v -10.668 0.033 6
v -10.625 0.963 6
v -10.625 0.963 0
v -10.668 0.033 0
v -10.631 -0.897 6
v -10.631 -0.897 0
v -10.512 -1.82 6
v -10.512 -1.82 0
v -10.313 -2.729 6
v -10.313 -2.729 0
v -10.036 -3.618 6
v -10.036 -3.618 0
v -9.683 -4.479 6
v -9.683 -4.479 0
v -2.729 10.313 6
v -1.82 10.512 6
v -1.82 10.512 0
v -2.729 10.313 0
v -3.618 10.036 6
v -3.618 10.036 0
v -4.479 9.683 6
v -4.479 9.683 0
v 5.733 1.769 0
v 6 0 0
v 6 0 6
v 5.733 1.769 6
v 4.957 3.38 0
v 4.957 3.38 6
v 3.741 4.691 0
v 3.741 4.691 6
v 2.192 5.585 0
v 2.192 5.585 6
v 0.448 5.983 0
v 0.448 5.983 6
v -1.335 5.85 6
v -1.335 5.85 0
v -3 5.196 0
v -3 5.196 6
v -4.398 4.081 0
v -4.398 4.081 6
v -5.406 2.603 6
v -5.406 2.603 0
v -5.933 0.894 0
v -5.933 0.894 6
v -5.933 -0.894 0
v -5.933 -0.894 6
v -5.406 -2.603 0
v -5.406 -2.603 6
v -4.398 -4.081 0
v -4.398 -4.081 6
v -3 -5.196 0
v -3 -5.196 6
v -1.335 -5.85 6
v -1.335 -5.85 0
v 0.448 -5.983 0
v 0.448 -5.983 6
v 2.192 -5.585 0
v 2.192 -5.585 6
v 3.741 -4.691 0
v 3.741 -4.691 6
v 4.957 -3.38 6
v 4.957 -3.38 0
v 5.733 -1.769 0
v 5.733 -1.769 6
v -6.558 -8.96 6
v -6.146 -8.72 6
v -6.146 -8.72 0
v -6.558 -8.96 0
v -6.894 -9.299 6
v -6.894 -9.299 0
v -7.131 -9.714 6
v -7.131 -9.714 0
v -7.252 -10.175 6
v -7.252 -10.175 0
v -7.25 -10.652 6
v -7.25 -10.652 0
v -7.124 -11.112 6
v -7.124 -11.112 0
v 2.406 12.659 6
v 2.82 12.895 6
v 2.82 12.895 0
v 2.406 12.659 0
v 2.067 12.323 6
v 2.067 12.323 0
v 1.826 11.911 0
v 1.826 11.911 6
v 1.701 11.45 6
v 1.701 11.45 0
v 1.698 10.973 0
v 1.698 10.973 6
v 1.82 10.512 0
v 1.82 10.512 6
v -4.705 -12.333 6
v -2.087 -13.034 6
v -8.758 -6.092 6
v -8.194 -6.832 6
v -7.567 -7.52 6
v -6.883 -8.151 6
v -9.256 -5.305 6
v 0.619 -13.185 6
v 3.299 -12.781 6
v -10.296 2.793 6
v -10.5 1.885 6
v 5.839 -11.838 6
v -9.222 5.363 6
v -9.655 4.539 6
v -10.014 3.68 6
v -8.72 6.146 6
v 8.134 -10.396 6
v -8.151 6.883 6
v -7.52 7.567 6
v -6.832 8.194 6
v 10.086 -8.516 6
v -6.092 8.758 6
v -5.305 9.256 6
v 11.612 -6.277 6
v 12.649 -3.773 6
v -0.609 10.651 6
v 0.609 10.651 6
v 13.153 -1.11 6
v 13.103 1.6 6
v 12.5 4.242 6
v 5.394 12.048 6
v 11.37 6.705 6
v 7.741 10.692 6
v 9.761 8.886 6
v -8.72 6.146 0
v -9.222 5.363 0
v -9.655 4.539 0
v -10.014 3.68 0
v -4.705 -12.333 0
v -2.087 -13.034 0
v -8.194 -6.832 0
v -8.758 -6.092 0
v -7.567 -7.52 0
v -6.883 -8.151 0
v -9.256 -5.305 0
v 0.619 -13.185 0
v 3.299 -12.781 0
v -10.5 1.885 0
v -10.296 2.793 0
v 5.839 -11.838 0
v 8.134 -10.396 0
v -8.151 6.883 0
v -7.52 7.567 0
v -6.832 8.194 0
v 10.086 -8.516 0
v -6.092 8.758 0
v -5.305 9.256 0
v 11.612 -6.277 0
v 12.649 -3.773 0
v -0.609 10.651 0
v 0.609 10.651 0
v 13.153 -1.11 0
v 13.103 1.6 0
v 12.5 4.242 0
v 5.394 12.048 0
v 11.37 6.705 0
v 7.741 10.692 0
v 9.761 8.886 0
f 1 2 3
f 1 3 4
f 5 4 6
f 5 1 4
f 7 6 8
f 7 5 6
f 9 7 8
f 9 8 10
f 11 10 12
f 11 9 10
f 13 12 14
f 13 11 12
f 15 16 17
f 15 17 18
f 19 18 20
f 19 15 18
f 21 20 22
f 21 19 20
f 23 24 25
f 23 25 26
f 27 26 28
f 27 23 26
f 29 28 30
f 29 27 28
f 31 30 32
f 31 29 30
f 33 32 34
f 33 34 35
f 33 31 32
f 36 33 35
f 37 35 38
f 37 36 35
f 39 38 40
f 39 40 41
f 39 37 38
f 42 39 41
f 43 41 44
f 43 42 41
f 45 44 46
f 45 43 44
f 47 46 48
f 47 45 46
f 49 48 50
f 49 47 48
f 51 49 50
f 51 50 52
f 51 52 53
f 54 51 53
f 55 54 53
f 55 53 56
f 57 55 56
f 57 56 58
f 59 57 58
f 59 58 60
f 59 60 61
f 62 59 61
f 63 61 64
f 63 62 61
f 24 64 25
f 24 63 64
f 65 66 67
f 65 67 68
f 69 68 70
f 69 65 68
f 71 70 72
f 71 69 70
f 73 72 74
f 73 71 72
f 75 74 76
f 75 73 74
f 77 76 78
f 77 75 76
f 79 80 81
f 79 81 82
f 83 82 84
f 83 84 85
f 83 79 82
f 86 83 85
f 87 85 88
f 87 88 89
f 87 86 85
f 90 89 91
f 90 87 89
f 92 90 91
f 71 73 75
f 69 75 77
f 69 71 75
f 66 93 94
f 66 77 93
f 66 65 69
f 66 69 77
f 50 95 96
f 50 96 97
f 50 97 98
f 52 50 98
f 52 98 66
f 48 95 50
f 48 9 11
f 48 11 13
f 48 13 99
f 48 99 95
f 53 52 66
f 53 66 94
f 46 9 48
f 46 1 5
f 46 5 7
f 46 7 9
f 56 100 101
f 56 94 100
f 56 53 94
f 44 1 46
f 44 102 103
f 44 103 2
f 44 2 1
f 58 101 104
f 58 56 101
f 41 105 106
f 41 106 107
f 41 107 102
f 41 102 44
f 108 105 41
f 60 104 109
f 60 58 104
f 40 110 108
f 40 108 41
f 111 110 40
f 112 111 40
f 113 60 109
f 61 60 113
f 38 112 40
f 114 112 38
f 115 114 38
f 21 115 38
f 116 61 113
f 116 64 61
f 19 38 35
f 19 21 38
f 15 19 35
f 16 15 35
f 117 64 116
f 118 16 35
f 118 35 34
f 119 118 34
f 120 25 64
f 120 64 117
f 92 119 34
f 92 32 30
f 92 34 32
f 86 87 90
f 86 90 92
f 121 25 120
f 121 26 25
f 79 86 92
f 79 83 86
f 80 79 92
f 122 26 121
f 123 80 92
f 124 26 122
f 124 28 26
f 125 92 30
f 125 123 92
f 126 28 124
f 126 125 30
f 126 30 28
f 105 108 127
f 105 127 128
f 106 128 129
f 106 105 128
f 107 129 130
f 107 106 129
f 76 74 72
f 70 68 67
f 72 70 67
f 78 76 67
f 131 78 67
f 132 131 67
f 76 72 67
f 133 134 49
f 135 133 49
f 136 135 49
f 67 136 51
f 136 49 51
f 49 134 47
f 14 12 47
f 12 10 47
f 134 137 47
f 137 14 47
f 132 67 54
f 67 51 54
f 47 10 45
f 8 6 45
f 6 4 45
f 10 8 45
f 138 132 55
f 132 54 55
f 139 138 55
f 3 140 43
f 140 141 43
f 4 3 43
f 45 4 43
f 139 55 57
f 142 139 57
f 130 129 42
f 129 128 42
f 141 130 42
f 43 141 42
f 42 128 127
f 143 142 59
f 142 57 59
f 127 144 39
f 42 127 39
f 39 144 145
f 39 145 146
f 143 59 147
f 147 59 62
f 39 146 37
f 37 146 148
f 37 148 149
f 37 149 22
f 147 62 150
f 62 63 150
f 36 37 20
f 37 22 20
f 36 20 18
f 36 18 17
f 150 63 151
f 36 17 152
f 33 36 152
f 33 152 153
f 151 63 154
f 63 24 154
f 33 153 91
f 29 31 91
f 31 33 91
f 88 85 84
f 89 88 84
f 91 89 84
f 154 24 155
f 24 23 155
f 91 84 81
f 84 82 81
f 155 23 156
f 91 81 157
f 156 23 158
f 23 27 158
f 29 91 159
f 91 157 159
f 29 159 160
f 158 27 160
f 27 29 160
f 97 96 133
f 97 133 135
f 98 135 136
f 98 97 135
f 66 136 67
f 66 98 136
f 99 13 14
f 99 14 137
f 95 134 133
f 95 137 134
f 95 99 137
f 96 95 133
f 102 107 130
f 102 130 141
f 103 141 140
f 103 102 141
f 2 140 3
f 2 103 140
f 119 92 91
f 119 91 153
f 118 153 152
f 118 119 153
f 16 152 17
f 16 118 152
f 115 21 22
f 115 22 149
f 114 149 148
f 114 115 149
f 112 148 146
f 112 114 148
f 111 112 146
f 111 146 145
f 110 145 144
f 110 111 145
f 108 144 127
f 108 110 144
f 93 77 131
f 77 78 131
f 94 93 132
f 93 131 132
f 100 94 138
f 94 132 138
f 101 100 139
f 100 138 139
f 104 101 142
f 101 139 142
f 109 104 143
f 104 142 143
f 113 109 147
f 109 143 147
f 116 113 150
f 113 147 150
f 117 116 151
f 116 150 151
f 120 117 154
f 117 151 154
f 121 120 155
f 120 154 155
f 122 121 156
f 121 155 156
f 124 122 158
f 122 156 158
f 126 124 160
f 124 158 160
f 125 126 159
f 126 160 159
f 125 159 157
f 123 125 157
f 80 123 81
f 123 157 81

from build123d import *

# Parameters (mm, degrees)
SKETCH1_R           = 13.2
SKETCH1_R_2         = 6
BOSS_EXTRUDE1_DEPTH = 6
CUT_EXTRUDE1_DEPTH  = 7
SKETCH3_R           = 13.2
SKETCH3_R_2         = 6
BOSS_EXTRUDE2_DEPTH = 6
CUT_EXTRUDE2_DEPTH  = 7
CIRPATTERN2_COUNT   = 10
CIRPATTERN2_ANGLE   = 135


with BuildPart() as part:
    # Sketch1 → Boss-Extrude1 (new body)
    with BuildSketch(Plane.XY):
        Circle(SKETCH1_R)
        Circle(SKETCH1_R_2, mode=Mode.SUBTRACT)
    extrude(amount=BOSS_EXTRUDE1_DEPTH)

    # Sketch2 → Cut-Extrude1 (cut, through all)
    with BuildSketch(Plane.XY.offset(6)):
        with BuildLine():
            ThreePointArc((-2.819851171, 12.895287487), (0, 13.2), (2.819851171, 12.895287487))
            ThreePointArc((2.819851171, 12.895287487), (1.826256171, 11.910750525), (1.819851171, 10.512))
            ThreePointArc((1.819851171, 10.512), (0, 10.668364555), (-1.819851171, 10.512))
            ThreePointArc((-1.819851171, 10.512), (-1.826256171, 11.910750525), (-2.819851171, 12.895287487))
        make_face()
    extrude(amount=-CUT_EXTRUDE1_DEPTH, mode=Mode.SUBTRACT)

    # Sketch3 → Boss-Extrude2 (add)
    with BuildSketch(Plane.XY):
        Circle(SKETCH3_R)
        Circle(SKETCH3_R_2, mode=Mode.SUBTRACT)
    extrude(amount=BOSS_EXTRUDE2_DEPTH)

    # Sketch4 → Cut-Extrude2 (cut, through all)
    with BuildSketch(Plane.XY.offset(6)):
        with BuildLine():
            ThreePointArc((-2.819851171, 12.895287487), (0, 13.2), (2.819851171, 12.895287487))
            ThreePointArc((2.819851171, 12.895287487), (1.826256171, 11.910750525), (1.819851171, 10.512))
            ThreePointArc((1.819851171, 10.512), (0, 10.668364555), (-1.819851171, 10.512))
            ThreePointArc((-1.819851171, 10.512), (-1.826256171, 11.910750525), (-2.819851171, 12.895287487))
        make_face()
    cut_extrude2 = extrude(amount=-CUT_EXTRUDE2_DEPTH, mode=Mode.SUBTRACT)

    # CirPattern2: Cut-Extrude2 ×10 about axis
    cirpattern2_axis = Axis((0, 0, 0), (0, 0, 1))
    for i in range(1, CIRPATTERN2_COUNT):
        add(cut_extrude2.rotate(cirpattern2_axis, i * CIRPATTERN2_ANGLE / (CIRPATTERN2_COUNT - 1)), mode=Mode.SUBTRACT)


solid = part.part
